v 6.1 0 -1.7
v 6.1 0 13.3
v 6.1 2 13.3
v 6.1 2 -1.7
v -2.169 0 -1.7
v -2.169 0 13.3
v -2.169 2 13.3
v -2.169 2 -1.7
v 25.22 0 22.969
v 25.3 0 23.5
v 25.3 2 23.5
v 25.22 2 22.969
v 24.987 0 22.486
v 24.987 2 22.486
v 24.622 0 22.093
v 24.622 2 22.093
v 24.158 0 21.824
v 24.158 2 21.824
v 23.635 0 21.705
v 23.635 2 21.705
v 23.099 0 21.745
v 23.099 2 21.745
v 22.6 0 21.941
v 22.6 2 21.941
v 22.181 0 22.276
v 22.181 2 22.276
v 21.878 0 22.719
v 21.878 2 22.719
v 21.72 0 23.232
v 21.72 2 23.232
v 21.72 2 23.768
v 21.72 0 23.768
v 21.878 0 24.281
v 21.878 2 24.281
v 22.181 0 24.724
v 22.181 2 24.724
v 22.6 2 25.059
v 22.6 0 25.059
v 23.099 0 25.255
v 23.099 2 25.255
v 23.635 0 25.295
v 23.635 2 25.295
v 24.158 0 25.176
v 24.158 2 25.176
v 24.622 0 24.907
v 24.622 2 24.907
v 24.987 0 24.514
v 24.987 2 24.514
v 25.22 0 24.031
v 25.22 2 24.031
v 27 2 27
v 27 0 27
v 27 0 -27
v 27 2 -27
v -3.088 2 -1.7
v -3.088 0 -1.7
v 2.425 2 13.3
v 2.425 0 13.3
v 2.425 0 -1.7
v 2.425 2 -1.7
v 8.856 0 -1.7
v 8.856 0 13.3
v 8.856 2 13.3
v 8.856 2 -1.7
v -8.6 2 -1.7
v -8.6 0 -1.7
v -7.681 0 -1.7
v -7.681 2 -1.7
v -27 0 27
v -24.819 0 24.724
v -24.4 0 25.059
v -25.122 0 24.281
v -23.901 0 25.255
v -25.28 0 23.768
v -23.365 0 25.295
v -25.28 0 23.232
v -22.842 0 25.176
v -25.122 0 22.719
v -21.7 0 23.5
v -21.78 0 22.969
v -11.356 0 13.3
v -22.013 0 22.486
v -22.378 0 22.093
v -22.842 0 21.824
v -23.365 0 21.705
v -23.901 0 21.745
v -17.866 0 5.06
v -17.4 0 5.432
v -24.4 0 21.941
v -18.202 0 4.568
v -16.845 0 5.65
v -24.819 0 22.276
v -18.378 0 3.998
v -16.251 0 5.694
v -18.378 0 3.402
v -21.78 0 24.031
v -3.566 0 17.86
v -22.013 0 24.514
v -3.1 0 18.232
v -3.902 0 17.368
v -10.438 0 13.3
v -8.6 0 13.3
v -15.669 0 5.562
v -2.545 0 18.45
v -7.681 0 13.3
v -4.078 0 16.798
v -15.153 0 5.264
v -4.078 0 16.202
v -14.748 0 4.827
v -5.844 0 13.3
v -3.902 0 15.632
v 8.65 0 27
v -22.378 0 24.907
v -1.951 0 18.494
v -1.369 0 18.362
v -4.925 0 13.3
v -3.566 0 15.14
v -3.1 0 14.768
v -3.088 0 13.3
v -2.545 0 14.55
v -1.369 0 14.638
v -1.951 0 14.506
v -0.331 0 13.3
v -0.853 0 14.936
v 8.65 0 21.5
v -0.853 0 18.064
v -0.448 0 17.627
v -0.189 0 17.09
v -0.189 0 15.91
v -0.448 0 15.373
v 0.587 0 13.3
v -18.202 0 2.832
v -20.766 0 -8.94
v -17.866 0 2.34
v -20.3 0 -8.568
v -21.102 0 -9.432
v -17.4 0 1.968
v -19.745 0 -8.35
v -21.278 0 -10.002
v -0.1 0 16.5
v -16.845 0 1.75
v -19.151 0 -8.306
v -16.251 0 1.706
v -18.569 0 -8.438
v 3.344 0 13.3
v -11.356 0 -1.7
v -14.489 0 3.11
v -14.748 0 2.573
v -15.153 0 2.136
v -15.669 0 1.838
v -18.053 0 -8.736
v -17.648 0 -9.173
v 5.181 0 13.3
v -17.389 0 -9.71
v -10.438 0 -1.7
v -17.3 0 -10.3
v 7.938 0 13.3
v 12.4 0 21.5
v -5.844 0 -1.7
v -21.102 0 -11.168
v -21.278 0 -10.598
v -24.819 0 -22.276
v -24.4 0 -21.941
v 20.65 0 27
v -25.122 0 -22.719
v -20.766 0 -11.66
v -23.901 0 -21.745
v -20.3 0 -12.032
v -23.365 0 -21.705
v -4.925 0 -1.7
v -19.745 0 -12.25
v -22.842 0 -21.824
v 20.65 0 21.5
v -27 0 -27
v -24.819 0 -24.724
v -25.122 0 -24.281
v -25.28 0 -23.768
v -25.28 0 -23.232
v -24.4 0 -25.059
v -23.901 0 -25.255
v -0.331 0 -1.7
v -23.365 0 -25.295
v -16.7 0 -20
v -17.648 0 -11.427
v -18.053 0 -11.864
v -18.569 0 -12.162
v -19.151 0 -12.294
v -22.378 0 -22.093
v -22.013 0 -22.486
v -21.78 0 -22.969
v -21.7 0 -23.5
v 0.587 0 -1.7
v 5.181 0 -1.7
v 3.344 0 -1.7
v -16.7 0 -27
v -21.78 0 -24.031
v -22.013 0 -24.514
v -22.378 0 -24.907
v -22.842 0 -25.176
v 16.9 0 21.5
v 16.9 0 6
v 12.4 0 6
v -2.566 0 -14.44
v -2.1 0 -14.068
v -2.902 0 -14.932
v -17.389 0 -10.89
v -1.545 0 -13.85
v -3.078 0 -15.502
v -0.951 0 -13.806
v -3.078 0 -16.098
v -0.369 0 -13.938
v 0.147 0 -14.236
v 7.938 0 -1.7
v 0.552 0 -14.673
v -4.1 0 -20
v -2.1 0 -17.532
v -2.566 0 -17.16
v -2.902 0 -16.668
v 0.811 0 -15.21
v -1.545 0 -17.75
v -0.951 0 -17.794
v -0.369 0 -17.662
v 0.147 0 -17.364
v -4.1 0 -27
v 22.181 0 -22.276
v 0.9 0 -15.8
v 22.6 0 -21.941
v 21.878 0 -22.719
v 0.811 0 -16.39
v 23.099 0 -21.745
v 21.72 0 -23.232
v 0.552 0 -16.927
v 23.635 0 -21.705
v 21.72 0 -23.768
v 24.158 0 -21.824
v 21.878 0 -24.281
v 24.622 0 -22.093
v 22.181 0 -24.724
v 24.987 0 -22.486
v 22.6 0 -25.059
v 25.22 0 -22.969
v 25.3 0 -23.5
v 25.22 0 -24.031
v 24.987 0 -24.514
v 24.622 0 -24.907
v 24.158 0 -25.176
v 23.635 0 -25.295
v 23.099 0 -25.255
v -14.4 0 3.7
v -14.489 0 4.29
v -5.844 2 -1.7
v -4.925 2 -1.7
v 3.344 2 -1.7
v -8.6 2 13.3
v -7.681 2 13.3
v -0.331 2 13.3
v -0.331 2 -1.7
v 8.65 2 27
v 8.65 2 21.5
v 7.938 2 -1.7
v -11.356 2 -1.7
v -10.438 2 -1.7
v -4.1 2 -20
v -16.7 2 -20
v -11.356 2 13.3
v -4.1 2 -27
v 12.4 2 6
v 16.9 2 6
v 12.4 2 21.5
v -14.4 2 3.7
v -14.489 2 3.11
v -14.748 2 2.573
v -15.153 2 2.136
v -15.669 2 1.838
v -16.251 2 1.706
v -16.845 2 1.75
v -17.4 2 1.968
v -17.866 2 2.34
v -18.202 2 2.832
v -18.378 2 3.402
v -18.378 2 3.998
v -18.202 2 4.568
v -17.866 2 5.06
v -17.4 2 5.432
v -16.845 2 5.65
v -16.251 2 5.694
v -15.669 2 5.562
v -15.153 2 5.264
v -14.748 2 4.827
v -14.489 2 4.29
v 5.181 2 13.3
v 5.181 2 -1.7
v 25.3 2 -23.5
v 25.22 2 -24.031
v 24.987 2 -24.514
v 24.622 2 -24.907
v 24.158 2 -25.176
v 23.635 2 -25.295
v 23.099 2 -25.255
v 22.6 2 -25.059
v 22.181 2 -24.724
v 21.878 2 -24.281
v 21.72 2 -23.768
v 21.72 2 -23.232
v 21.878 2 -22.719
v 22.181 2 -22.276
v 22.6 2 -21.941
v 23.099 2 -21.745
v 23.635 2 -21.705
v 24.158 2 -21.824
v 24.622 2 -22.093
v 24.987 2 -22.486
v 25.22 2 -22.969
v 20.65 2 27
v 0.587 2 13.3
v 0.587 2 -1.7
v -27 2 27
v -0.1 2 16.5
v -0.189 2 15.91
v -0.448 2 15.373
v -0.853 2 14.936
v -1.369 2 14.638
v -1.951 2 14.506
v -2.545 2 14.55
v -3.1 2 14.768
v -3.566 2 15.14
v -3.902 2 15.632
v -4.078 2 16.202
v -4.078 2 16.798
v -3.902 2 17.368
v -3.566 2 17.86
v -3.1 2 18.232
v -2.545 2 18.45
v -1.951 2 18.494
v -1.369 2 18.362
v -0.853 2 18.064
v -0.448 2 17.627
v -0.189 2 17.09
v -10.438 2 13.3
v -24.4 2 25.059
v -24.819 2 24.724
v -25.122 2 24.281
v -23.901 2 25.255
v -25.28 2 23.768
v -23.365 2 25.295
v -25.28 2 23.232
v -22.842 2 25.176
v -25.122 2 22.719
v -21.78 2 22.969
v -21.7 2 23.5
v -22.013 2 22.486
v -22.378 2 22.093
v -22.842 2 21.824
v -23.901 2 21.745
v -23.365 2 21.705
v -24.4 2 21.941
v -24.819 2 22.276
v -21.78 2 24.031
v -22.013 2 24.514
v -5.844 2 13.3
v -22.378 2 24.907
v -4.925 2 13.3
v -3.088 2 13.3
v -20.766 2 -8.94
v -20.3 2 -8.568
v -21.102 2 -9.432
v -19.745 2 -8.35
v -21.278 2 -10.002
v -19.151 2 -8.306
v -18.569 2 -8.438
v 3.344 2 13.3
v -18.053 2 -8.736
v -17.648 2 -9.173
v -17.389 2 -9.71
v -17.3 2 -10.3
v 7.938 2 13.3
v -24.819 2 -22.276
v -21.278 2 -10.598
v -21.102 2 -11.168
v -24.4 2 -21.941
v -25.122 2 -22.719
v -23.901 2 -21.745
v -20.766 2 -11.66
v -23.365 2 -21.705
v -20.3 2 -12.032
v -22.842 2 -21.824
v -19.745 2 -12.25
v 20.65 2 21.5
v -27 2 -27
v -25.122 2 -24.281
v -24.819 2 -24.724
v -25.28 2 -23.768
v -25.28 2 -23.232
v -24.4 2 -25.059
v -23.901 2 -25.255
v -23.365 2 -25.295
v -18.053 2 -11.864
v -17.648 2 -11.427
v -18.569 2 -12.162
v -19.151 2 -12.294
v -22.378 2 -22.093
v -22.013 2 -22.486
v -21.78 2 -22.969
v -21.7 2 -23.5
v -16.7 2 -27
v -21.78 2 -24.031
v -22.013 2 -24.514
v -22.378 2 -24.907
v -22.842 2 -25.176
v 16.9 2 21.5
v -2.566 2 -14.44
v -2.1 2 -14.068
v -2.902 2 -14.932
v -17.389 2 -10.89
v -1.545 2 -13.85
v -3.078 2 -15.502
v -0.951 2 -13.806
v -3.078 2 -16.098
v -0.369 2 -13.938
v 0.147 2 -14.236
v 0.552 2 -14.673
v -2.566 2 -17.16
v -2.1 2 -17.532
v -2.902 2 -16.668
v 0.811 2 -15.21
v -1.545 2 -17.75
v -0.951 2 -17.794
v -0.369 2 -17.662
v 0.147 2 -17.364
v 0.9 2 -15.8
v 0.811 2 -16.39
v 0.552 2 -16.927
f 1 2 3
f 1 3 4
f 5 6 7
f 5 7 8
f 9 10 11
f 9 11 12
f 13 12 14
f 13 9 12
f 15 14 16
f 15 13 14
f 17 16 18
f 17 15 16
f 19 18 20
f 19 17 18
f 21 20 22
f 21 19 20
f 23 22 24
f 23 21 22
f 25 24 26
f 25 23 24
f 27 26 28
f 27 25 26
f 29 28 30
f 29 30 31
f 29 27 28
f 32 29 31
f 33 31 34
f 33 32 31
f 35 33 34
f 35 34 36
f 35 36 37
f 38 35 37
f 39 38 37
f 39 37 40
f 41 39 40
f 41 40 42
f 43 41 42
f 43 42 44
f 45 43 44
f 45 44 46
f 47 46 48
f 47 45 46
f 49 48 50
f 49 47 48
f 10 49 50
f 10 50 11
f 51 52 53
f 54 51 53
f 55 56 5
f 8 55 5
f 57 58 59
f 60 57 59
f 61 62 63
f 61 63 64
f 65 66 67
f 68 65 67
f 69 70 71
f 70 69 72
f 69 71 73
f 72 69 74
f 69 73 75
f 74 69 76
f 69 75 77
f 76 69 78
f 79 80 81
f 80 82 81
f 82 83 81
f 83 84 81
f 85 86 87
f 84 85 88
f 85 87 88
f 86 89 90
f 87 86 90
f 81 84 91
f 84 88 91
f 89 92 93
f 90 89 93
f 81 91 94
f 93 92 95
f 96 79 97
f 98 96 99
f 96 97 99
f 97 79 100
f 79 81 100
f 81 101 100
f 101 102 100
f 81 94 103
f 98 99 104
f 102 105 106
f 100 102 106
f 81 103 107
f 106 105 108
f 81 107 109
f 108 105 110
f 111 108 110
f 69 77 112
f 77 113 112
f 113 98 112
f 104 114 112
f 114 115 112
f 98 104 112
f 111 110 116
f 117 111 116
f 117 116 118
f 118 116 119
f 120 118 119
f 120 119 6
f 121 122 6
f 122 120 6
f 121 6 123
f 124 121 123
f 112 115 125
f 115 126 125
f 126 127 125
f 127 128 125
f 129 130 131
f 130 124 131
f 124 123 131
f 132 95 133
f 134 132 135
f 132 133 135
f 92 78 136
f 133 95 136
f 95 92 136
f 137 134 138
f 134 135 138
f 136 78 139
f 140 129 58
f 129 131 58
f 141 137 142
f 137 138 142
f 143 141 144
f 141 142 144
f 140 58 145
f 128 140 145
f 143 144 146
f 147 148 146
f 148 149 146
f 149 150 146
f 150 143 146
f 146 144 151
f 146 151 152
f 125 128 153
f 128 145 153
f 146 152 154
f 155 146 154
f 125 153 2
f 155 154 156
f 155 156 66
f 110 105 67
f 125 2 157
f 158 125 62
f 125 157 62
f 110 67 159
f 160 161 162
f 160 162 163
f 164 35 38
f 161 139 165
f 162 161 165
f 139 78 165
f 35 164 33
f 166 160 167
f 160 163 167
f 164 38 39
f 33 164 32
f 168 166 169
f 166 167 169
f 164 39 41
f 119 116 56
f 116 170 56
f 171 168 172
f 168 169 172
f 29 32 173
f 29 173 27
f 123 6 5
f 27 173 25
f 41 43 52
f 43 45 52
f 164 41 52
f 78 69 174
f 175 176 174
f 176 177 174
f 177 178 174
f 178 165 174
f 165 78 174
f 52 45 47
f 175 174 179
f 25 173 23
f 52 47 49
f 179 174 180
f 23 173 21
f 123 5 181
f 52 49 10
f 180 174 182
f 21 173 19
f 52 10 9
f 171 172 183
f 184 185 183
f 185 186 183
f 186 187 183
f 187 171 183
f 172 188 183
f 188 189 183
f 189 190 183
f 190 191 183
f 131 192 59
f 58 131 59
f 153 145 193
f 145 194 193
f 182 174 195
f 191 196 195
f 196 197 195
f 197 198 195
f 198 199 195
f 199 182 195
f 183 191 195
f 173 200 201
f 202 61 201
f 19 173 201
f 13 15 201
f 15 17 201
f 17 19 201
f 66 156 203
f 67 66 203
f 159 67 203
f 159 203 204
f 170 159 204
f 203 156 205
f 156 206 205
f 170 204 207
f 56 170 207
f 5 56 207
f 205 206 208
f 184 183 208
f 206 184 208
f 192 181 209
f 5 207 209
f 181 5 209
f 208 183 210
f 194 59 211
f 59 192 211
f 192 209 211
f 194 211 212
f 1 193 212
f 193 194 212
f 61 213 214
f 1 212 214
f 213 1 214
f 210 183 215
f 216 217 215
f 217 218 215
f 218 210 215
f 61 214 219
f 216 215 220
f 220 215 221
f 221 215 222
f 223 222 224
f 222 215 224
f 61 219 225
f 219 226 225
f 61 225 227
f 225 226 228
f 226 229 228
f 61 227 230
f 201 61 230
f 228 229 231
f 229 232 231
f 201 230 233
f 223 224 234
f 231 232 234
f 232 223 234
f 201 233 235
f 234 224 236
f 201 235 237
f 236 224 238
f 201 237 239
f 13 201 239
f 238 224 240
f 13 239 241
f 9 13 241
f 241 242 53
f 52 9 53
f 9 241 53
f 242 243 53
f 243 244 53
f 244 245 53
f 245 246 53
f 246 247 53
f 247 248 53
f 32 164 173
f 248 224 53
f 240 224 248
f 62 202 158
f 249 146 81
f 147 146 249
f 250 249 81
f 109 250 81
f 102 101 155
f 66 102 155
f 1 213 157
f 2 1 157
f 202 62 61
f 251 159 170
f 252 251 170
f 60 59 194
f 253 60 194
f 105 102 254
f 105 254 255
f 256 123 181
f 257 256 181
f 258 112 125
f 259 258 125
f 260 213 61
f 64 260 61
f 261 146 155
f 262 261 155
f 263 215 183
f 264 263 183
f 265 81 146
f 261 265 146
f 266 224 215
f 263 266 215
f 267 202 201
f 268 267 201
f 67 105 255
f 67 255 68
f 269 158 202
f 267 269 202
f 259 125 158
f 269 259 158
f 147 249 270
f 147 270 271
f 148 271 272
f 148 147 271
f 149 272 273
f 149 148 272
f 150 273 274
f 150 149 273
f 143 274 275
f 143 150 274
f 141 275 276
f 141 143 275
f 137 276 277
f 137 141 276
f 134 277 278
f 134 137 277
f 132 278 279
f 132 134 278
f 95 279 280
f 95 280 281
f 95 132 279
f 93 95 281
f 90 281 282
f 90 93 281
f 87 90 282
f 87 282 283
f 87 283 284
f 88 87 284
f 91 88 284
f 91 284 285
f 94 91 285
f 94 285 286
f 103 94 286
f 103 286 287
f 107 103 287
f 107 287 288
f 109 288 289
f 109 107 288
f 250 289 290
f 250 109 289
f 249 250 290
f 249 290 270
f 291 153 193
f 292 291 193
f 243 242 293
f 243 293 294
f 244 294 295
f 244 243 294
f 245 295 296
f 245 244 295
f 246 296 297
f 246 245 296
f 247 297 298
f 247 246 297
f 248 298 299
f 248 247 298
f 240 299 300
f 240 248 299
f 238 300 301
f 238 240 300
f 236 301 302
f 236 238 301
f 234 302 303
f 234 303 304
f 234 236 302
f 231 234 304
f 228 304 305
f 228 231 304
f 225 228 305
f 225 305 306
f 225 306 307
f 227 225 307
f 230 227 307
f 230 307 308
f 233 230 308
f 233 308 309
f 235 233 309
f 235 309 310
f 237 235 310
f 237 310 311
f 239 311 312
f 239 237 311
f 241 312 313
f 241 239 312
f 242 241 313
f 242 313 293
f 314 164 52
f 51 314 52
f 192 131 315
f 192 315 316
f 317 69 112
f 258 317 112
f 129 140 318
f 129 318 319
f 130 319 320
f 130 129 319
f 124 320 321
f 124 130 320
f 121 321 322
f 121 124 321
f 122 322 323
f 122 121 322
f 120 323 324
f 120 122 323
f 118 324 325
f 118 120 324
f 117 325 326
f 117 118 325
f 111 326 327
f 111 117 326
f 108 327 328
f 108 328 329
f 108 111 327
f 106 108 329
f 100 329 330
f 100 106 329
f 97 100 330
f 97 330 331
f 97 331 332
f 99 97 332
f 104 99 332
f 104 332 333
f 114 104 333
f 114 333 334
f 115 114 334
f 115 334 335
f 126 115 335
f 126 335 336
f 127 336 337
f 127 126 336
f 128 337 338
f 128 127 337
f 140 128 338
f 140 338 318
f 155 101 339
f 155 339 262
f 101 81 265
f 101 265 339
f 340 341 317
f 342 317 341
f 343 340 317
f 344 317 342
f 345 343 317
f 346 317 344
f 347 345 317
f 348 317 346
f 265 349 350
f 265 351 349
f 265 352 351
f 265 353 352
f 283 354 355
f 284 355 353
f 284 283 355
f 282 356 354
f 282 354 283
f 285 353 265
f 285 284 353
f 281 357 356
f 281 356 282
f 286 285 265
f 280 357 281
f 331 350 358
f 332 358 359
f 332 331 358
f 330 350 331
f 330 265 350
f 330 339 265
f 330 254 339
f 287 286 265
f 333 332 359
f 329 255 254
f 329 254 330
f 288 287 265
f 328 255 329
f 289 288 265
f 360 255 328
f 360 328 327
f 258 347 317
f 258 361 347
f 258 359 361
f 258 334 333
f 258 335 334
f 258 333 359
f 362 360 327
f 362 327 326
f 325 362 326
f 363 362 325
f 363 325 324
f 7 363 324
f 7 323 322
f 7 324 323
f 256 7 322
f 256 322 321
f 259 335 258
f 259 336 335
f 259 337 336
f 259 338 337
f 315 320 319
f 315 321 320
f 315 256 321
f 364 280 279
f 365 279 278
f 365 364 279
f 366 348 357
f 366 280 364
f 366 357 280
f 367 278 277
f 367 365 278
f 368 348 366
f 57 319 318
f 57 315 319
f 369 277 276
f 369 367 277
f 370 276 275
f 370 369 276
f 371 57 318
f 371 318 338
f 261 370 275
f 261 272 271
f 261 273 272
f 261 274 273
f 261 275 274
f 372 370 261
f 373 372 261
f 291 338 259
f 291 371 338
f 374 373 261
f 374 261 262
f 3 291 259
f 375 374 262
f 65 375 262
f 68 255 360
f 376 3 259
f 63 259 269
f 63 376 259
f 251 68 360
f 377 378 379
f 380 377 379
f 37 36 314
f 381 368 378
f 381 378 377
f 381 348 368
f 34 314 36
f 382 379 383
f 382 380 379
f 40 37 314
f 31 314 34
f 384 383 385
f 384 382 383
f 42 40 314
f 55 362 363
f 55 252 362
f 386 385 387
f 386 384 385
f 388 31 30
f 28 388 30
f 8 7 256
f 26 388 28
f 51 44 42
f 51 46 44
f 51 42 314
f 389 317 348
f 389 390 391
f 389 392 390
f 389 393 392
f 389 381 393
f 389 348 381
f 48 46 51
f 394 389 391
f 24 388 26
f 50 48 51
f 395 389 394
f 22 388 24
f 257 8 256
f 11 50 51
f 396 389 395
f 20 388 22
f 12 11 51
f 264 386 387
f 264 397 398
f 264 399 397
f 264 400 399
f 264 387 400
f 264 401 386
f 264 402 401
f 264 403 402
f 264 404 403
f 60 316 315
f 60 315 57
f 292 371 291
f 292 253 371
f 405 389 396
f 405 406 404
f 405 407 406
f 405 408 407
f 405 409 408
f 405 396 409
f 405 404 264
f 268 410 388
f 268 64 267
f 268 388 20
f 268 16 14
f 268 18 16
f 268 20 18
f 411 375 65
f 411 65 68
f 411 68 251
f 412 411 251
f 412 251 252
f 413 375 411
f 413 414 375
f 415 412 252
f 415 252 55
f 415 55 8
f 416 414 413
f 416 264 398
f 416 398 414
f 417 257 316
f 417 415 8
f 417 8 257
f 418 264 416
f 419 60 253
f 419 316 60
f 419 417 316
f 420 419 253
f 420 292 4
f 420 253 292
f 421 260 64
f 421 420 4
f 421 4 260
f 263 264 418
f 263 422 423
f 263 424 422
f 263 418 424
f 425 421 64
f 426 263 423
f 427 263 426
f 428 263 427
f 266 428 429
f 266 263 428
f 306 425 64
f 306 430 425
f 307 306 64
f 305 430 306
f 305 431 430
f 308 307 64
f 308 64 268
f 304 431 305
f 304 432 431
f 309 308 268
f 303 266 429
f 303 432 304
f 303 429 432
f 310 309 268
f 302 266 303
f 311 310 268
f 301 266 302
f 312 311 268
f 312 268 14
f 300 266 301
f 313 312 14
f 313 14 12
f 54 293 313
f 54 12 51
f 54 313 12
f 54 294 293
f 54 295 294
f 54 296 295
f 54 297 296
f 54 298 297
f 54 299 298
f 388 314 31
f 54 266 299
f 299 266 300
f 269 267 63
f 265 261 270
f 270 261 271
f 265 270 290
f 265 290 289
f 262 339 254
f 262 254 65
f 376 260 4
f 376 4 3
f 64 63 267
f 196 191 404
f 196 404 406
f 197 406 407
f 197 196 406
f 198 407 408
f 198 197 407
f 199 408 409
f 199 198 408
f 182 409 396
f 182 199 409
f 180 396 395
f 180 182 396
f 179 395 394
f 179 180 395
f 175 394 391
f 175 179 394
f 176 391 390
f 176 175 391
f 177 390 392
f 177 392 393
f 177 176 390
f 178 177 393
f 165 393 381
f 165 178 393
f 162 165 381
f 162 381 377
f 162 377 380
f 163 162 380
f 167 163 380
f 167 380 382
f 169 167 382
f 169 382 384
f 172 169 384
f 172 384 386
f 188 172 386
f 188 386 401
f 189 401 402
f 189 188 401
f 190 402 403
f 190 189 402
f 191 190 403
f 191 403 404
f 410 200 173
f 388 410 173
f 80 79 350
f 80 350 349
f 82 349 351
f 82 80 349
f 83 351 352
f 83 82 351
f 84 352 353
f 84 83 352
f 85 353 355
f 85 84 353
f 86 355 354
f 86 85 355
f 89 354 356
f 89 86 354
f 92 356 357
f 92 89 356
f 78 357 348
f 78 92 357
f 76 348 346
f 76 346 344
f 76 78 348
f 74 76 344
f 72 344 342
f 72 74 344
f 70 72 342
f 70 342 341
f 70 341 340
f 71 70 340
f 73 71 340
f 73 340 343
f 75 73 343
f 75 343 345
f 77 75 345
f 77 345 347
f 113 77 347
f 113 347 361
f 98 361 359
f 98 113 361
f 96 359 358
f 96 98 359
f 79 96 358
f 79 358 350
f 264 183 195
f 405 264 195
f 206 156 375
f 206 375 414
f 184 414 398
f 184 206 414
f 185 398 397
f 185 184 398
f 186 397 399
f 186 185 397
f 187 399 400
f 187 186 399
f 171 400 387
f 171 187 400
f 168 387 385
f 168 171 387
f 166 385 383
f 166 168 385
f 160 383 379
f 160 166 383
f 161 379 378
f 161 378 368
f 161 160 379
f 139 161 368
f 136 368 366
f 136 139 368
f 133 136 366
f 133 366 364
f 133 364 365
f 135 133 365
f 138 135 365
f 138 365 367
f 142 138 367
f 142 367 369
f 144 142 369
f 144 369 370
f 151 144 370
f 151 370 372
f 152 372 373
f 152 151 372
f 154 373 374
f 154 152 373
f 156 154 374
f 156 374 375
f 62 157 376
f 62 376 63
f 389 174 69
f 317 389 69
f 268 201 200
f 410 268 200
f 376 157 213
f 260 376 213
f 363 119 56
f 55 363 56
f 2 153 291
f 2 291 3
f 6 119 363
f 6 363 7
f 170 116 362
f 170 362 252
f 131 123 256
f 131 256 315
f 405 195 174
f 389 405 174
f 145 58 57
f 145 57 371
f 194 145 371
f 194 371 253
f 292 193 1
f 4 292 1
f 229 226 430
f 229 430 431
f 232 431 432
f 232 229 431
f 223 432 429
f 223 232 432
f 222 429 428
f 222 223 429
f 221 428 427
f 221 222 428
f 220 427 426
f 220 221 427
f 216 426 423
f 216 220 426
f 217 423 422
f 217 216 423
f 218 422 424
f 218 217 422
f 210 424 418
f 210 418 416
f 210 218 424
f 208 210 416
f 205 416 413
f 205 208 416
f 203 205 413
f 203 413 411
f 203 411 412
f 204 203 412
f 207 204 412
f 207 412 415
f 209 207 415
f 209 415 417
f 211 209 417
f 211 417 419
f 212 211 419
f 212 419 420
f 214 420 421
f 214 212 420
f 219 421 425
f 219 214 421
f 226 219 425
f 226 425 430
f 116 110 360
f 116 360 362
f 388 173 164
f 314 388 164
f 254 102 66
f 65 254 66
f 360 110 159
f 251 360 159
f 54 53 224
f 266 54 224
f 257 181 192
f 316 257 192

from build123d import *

# Parameters (mm, degrees)
SKETCH_3_R      = 2
SKETCH_3_W      = 0.91875
SKETCH_3_H      = 15
SKETCH_3_R_2    = 1.8
EXTRUDE_2_DEPTH = 2


with BuildPart() as part:
    # 草图3 → 凸台-拉伸2 (new body)
    with BuildSketch(Plane(origin=(0, 0, 0), x_dir=(1, 0, 0), z_dir=(0, 1, 0))):
        Polygon((16.9, -21.5), (20.65, -21.5), (20.65, -27), (27, -27), (27, 27), (-4.1, 27), (-4.1, 20), (-16.7, 20), (-16.7, 27), (-27, 27), (-27, -27), (8.65, -27), (8.65, -21.5), (12.4, -21.5), (12.4, -6), (16.9, -6), align=None)
        with Locations((-19.3, 10.3)):
            Circle(SKETCH_3_R, mode=Mode.SUBTRACT)
        with Locations((-2.1, -16.5)):
            Circle(SKETCH_3_R, mode=Mode.SUBTRACT)
        with Locations((-16.4, -3.7)):
            Circle(SKETCH_3_R, mode=Mode.SUBTRACT)
        with Locations((-10.896875, -5.8)):
            Rectangle(SKETCH_3_W, SKETCH_3_H, mode=Mode.SUBTRACT)
        with Locations((-8.140625, -5.8)):
            Rectangle(SKETCH_3_W, SKETCH_3_H, mode=Mode.SUBTRACT)
        with Locations((-5.384375, -5.8)):
            Rectangle(SKETCH_3_W, SKETCH_3_H, mode=Mode.SUBTRACT)
        with Locations((-2.628125, -5.8)):
            Rectangle(SKETCH_3_W, SKETCH_3_H, mode=Mode.SUBTRACT)
        with Locations((0.128125, -5.8)):
            Rectangle(SKETCH_3_W, SKETCH_3_H, mode=Mode.SUBTRACT)
        with Locations((2.884375, -5.8)):
            Rectangle(SKETCH_3_W, SKETCH_3_H, mode=Mode.SUBTRACT)
        with Locations((23.5, -23.5)):
            Circle(SKETCH_3_R_2, mode=Mode.SUBTRACT)
        with Locations((5.640625, -5.8)):
            Rectangle(SKETCH_3_W, SKETCH_3_H, mode=Mode.SUBTRACT)
        with Locations((8.396875, -5.8)):
            Rectangle(SKETCH_3_W, SKETCH_3_H, mode=Mode.SUBTRACT)
        with Locations((-1.1, 15.8)):
            Circle(SKETCH_3_R, mode=Mode.SUBTRACT)
        with Locations((23.5, 23.5)):
            Circle(SKETCH_3_R_2, mode=Mode.SUBTRACT)
        with Locations((-23.5, -23.5)):
            Circle(SKETCH_3_R_2, mode=Mode.SUBTRACT)
        with Locations((-23.5, 23.5)):
            Circle(SKETCH_3_R_2, mode=Mode.SUBTRACT)
    extrude(amount=EXTRUDE_2_DEPTH)


solid = part.part
